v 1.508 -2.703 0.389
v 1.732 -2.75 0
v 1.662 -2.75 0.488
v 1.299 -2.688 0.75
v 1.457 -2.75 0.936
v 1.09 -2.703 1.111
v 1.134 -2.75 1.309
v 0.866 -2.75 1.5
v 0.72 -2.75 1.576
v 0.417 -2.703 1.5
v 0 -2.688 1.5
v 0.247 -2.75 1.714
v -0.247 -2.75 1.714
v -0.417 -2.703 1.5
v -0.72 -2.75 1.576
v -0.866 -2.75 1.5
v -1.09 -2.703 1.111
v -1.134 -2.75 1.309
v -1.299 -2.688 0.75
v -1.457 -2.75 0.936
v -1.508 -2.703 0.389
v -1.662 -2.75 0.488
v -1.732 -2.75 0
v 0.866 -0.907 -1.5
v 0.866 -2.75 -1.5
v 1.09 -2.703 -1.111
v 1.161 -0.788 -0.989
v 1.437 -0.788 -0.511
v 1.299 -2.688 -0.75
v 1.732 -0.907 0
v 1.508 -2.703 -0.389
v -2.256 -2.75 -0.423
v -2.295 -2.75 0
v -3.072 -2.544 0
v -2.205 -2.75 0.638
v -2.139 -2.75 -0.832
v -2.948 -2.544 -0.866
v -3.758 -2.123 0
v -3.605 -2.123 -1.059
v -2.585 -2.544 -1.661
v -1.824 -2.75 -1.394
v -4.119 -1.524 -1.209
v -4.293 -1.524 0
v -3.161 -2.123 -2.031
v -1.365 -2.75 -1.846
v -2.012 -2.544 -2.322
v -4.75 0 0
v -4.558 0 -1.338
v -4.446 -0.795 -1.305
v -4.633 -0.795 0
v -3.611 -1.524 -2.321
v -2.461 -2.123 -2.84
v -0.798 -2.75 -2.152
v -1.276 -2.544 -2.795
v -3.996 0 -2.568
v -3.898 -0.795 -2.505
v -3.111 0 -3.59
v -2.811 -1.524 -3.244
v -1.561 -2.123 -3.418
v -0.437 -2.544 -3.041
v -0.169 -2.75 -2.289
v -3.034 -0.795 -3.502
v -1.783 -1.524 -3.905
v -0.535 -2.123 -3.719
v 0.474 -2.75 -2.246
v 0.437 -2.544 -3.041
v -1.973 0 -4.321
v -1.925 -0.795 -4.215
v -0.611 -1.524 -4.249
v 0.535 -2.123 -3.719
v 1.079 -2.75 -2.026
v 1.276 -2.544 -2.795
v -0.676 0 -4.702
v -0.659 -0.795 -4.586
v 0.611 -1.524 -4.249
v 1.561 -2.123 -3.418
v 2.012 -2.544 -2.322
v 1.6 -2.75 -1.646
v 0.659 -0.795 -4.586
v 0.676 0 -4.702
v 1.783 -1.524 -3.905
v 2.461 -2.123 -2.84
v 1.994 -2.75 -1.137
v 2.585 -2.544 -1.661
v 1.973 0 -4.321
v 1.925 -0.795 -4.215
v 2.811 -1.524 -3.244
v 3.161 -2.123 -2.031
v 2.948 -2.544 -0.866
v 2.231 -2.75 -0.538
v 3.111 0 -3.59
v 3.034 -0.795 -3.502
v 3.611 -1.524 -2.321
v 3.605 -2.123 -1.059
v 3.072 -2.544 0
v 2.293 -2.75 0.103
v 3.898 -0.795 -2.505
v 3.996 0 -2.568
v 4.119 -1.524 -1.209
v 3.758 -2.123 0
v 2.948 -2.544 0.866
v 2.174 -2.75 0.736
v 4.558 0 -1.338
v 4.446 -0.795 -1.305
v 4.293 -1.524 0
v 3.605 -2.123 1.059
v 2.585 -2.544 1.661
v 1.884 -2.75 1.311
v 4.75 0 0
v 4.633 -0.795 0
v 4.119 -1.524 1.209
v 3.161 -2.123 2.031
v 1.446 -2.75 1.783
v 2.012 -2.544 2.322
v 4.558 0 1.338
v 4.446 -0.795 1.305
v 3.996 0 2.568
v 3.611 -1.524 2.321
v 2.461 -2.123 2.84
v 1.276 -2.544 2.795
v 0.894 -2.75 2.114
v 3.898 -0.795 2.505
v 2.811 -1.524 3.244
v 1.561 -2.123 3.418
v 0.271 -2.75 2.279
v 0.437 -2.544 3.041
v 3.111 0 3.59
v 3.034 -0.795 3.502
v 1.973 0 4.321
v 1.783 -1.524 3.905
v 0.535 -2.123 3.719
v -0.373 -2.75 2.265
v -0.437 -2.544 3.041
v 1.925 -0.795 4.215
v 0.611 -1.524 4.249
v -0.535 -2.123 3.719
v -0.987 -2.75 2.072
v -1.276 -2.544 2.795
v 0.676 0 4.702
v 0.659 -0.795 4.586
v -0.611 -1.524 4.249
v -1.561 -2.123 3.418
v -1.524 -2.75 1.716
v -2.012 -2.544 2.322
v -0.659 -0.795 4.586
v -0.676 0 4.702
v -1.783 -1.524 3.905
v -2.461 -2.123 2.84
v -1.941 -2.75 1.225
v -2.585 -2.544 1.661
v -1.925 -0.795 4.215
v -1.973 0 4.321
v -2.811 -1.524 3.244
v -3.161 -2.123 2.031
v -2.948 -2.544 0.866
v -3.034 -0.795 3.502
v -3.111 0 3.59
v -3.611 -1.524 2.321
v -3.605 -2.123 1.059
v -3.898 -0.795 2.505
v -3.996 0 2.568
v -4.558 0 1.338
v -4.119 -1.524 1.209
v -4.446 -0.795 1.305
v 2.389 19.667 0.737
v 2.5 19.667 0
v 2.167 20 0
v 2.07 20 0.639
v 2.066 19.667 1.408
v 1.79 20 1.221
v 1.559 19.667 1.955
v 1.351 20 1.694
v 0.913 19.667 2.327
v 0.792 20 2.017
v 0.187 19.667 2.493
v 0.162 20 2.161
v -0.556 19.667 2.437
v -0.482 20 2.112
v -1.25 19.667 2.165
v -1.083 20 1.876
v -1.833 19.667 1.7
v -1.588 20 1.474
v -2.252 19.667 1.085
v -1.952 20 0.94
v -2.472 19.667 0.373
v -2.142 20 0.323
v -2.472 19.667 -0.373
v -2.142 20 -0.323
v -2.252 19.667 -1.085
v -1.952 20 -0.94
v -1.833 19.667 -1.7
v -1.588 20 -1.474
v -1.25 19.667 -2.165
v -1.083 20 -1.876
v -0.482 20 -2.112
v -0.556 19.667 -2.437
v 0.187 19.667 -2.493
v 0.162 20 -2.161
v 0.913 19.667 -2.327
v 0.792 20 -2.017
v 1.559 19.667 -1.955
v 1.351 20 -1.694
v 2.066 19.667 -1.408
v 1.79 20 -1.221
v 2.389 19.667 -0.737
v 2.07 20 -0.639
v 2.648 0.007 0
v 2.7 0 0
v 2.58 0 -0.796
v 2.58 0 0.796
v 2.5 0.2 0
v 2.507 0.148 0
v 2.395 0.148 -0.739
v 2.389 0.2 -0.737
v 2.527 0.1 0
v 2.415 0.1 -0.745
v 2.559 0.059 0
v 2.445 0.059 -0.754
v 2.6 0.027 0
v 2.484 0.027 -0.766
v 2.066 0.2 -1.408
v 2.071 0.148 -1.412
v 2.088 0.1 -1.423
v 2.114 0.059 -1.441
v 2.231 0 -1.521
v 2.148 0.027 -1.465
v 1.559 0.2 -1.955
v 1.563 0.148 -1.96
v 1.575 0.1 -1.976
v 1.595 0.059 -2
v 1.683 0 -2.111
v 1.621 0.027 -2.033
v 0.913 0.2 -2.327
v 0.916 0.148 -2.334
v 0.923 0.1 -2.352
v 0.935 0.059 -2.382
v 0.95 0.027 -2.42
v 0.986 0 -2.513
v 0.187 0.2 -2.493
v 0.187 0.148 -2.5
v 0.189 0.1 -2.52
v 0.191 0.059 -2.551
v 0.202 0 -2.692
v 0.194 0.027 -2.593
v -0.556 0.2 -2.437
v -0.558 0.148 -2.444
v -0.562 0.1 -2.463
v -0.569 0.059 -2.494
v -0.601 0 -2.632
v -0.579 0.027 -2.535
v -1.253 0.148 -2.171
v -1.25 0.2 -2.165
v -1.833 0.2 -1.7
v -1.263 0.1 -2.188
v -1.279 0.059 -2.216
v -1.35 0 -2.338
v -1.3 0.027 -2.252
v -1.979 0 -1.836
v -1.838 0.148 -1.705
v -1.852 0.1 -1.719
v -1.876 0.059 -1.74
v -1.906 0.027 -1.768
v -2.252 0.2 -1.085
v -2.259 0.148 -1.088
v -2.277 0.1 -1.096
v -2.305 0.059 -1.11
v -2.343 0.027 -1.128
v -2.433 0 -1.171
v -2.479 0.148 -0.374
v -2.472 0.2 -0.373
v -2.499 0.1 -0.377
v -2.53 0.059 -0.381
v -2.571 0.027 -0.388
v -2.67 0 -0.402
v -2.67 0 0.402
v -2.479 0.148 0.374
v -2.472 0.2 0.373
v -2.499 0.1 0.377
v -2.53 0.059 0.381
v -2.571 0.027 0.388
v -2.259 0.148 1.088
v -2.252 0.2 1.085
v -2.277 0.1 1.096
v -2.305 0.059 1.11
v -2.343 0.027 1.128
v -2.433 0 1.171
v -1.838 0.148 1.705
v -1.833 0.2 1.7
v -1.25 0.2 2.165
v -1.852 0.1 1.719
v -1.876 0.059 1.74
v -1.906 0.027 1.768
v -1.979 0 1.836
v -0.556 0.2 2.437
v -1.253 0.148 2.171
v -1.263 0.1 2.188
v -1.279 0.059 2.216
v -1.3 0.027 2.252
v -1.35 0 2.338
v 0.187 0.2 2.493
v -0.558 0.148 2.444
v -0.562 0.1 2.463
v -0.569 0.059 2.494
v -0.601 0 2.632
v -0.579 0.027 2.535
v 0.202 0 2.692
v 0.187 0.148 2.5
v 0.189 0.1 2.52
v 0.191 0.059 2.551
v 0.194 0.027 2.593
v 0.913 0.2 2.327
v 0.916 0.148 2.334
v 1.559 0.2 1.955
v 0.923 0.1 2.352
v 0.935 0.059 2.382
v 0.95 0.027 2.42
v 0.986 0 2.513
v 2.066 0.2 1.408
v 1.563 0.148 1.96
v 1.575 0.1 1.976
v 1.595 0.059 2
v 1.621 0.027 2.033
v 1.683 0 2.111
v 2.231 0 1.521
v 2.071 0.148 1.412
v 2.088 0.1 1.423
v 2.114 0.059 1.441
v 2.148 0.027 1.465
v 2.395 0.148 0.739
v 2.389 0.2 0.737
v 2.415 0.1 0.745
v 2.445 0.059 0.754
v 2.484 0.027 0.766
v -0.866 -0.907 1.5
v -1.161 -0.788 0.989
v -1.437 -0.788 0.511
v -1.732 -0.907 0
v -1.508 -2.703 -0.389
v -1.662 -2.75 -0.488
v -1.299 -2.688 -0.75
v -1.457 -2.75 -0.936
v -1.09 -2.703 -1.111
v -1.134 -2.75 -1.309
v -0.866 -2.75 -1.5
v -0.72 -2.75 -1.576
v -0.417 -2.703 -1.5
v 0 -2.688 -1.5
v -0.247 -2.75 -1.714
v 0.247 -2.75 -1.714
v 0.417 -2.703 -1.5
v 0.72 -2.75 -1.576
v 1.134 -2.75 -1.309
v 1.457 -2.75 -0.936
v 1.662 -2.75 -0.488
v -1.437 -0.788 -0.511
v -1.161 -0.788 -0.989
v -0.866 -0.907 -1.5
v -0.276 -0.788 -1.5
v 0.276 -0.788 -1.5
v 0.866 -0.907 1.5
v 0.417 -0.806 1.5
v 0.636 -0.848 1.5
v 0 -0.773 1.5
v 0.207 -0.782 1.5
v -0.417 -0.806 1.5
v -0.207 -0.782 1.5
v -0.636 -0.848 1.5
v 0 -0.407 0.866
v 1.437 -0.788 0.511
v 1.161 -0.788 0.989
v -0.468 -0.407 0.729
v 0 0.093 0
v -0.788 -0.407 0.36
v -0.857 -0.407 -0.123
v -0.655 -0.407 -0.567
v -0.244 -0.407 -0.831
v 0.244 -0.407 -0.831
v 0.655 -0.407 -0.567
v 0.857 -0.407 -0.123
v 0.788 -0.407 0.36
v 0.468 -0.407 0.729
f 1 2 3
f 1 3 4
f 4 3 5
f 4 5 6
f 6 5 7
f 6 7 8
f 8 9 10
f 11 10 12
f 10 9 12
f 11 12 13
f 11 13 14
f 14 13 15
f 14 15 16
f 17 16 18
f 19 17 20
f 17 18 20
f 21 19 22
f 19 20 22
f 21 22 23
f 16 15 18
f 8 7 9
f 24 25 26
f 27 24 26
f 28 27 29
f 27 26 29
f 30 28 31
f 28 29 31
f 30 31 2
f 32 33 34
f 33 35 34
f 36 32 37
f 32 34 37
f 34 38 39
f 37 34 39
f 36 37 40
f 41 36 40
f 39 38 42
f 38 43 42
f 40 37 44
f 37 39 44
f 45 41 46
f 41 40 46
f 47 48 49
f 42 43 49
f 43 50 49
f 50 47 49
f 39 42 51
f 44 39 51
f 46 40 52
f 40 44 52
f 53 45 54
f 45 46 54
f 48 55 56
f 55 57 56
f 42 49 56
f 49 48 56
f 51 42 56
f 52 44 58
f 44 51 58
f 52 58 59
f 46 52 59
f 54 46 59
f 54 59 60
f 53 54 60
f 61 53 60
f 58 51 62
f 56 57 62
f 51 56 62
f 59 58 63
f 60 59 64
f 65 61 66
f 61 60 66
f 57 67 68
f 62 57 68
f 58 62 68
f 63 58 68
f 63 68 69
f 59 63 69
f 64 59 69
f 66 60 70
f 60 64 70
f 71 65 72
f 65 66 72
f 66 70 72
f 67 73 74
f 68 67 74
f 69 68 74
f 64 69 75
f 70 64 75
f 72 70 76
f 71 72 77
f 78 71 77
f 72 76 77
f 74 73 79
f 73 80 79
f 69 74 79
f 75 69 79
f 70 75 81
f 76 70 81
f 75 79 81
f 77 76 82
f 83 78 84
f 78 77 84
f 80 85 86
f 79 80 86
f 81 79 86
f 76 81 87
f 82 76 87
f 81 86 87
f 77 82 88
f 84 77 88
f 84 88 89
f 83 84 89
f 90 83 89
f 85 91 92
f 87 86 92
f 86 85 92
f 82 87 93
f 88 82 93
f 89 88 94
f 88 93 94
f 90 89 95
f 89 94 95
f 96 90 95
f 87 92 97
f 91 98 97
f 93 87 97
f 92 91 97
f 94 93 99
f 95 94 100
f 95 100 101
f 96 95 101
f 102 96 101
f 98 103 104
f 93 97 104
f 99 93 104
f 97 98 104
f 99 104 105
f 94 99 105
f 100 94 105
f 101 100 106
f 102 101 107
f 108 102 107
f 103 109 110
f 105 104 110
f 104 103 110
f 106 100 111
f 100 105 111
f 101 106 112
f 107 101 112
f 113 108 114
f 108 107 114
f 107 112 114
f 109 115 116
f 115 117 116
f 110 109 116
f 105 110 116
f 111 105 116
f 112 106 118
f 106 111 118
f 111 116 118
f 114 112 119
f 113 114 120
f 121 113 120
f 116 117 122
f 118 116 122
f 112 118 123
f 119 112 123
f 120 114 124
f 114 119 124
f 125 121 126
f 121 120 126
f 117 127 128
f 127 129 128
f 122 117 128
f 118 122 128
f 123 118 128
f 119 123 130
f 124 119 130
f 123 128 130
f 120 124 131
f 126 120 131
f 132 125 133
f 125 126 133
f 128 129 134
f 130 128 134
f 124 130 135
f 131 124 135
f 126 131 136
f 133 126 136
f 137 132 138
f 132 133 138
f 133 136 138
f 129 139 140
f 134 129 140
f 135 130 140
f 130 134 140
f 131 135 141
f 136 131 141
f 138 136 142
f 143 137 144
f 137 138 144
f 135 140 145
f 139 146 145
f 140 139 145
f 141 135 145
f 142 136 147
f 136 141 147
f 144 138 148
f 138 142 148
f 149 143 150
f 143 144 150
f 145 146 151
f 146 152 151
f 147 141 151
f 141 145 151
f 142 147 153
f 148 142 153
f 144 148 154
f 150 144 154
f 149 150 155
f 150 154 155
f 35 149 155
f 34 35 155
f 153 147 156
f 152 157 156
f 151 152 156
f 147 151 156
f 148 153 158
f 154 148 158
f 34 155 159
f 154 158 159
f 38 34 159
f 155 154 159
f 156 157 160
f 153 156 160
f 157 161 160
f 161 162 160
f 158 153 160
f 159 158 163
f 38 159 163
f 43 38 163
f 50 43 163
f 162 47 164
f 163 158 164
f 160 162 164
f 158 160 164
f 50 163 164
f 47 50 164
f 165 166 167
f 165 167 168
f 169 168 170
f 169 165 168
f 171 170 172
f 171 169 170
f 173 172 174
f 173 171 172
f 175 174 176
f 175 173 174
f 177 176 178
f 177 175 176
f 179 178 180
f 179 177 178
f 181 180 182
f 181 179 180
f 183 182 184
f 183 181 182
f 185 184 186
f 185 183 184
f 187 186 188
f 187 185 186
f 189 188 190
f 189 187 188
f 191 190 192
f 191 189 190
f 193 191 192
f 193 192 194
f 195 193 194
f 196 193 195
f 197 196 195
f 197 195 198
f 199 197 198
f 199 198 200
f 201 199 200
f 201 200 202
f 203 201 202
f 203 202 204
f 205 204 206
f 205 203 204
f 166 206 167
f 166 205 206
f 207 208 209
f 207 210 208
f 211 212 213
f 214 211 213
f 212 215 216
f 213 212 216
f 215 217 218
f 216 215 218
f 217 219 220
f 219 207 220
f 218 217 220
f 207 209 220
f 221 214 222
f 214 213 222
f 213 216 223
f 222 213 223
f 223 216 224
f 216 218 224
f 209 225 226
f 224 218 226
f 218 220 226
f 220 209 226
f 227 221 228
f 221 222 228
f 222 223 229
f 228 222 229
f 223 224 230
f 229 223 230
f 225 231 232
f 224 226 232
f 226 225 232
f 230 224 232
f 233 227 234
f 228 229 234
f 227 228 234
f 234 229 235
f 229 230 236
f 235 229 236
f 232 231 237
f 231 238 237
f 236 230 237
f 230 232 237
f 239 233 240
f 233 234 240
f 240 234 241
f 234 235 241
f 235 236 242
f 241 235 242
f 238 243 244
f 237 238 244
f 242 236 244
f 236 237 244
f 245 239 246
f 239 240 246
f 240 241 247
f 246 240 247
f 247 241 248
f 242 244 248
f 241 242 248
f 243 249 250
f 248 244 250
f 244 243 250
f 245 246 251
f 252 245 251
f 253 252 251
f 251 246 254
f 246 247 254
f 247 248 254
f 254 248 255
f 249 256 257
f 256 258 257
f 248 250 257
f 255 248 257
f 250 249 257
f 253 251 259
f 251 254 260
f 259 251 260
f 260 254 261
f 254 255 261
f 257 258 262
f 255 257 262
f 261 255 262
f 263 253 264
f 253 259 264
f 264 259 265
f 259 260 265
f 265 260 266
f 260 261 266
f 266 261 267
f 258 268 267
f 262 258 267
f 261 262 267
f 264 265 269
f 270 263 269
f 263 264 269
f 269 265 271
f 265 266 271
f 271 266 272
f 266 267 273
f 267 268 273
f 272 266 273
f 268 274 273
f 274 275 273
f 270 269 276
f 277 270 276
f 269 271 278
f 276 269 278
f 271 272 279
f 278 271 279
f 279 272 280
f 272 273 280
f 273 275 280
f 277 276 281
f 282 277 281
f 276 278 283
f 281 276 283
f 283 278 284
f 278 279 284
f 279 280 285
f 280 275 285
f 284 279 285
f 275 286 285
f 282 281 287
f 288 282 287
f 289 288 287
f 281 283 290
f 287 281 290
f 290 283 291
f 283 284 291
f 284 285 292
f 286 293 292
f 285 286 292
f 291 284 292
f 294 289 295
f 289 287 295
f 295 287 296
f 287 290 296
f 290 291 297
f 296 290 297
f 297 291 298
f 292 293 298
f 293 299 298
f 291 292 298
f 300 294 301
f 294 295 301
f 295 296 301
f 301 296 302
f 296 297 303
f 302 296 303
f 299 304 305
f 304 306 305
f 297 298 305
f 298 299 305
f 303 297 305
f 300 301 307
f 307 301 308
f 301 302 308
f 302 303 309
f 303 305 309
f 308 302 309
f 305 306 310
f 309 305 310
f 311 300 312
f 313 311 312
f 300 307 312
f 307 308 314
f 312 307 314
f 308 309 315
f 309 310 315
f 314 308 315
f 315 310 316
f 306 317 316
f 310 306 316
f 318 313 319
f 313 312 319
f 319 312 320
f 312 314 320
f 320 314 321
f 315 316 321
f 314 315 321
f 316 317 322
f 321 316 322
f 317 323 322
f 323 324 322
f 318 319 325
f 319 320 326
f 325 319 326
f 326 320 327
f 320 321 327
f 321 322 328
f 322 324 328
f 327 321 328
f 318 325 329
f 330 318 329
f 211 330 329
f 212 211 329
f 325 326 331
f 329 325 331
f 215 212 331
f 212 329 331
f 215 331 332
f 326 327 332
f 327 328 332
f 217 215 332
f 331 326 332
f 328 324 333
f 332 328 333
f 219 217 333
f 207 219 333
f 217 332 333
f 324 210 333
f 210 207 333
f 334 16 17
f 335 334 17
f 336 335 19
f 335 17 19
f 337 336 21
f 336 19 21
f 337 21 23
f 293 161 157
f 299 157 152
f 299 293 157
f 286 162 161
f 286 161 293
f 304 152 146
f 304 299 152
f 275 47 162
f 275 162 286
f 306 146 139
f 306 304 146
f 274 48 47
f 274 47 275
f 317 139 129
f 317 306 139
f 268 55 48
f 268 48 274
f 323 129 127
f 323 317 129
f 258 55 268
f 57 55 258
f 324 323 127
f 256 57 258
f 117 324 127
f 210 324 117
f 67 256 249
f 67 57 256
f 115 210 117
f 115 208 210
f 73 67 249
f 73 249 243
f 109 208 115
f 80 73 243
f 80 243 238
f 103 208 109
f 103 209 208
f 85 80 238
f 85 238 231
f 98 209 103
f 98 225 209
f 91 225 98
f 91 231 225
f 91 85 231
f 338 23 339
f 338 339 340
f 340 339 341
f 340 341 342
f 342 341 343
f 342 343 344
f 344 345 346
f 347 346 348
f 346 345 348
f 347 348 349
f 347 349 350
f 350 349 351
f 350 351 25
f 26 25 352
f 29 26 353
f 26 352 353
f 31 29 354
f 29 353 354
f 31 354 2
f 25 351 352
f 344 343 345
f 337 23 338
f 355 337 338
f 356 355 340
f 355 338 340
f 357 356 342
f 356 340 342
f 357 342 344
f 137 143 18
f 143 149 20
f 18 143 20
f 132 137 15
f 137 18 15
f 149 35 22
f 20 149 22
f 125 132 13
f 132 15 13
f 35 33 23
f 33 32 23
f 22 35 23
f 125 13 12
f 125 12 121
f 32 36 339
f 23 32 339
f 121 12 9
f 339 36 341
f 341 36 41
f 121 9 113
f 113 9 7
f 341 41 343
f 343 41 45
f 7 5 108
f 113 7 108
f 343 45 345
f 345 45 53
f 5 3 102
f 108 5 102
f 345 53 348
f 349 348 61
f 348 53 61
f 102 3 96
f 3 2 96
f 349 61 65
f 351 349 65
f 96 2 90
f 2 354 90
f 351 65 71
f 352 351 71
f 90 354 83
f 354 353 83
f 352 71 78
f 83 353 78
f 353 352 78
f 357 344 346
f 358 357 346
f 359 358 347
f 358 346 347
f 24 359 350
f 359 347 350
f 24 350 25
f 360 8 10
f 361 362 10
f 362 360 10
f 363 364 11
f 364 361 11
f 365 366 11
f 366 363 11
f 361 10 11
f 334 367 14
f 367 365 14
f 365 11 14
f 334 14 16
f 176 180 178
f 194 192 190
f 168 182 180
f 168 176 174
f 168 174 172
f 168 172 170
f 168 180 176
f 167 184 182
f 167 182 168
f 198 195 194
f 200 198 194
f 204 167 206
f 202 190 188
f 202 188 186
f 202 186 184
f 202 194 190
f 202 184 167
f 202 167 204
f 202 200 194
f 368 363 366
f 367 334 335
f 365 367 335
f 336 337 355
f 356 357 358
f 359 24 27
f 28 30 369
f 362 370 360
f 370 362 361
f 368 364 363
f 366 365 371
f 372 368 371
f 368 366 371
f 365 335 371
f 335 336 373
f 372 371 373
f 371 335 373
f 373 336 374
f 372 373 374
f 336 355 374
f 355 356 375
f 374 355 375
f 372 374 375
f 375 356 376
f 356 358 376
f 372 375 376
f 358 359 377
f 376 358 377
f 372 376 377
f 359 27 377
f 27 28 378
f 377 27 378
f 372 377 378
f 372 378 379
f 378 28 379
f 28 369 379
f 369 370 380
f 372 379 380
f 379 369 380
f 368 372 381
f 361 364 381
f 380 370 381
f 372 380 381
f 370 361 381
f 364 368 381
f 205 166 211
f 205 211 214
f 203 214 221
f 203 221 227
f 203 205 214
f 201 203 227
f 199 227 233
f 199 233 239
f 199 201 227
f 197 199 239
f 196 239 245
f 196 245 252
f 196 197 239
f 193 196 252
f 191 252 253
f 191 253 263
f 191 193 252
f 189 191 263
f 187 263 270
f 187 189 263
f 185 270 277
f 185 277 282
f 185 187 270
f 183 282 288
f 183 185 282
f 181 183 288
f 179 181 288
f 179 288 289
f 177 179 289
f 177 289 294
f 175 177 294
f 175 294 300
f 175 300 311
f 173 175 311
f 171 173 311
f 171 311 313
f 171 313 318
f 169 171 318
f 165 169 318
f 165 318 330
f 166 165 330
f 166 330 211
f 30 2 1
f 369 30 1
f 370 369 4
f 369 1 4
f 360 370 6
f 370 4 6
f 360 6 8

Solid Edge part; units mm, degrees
sketch "Sketch1" plane through (0, 0, 0) normal (0, 0, 1) x (1, 0, 0)
  line L0 (2.5, 0) -> (2.5, 20)
  line L1 (0, 20) -> (2.5, 20)
  line L2 (0, 0) -> (0, 20)
  line L3 (0, 0) -> (0, -2.75)
  line L4 (0, -2.75) -> (4.75, -2.75)
  line L5 (4.75, -2.75) -> (4.75, 0)
  line L6 (4.75, 0) -> (2.5, 0)
revolve "RevolvedProtrusion1" add sketch "Sketch1" angle 360 about axis through (0, 0, 0) along (0, 1, 0)
sketch "Sketch2" plane through (0, 0, 0) normal (1, 0, 0) x (0, 1, 0)
  line L0 (-2.75, 2.2215) -> (-1.19, 2.2215)
  line L1 (0.0926, 0) -> (-1.19, 2.2215)
  line L2 (-2.75, 0) -> (0.0926, 0)
  line L3 (-2.75, 0) -> (-2.75, 2.2215)
revolve "RevolvedCutout1" cut sketch "Sketch2" angle 360 about axis through (0, -4.5, 0) along (0, 1, 0)
sketch "Sketch3" plane through (0, -2.75, 0) normal (0, -1, 0) x (0, 0, 1)
  circle A0 centre (0, 0) radius 2.2215
  line L0 (-1.5, -0.866) -> (0, -1.7321)
  line L1 (0, -1.7321) -> (1.5, -0.866)
  line L2 (1.5, -0.866) -> (1.5, 0.866)
  line L3 (1.5, 0.866) -> (0, 1.7321)
  line L4 (0, 1.7321) -> (-1.5, 0.866)
  line L5 (-1.5, 0.866) -> (-1.5, -0.866)
  dimension "D1" = 3
extrude "Protrusion1" add sketch "Sketch3" against normal up to next
sketch "Sketch4" plane through (0, 0, 0) normal (0, 0, 1) x (1, 0, 0)
  line L0 (-1.7321, -2.75) -> (0, -2.75)
  line L1 (0, -2.75) -> (0, -2.2859)
  line L2 (0, -2.2859) -> (-1.7321, -2.75)
revolve "RevolvedCutout2" cut sketch "Sketch4" angle 360 about axis through (0, -4.5, 0) along (0, 1, 0)
fillet "Round1" radius 0.2 1 edges at (0, 0, -2.5)
chamfer "倒斜角_2" distance 0.3333 angle 45 1 edges at (0, 20, -2.5)
cosmetic_thread "螺纹_3" size "M5" thread depth 18.4
sketch "Sketch5" plane through (0, 0, 0) normal (0, 0, 1) x (1, 0, 0)
  arc A0 (-2.2953, -2.75) -> (-4.75, 0) centre (-1.9822, 0) cw
revolve "RevolvedCutout3" cut sketch "Sketch5" angle 360 about axis through (0, 0, 0) along (0, -1, 0) material side at (-4.0844, -1.8764, 0)
properties part number "N2611-1122" material "铝 1060"
